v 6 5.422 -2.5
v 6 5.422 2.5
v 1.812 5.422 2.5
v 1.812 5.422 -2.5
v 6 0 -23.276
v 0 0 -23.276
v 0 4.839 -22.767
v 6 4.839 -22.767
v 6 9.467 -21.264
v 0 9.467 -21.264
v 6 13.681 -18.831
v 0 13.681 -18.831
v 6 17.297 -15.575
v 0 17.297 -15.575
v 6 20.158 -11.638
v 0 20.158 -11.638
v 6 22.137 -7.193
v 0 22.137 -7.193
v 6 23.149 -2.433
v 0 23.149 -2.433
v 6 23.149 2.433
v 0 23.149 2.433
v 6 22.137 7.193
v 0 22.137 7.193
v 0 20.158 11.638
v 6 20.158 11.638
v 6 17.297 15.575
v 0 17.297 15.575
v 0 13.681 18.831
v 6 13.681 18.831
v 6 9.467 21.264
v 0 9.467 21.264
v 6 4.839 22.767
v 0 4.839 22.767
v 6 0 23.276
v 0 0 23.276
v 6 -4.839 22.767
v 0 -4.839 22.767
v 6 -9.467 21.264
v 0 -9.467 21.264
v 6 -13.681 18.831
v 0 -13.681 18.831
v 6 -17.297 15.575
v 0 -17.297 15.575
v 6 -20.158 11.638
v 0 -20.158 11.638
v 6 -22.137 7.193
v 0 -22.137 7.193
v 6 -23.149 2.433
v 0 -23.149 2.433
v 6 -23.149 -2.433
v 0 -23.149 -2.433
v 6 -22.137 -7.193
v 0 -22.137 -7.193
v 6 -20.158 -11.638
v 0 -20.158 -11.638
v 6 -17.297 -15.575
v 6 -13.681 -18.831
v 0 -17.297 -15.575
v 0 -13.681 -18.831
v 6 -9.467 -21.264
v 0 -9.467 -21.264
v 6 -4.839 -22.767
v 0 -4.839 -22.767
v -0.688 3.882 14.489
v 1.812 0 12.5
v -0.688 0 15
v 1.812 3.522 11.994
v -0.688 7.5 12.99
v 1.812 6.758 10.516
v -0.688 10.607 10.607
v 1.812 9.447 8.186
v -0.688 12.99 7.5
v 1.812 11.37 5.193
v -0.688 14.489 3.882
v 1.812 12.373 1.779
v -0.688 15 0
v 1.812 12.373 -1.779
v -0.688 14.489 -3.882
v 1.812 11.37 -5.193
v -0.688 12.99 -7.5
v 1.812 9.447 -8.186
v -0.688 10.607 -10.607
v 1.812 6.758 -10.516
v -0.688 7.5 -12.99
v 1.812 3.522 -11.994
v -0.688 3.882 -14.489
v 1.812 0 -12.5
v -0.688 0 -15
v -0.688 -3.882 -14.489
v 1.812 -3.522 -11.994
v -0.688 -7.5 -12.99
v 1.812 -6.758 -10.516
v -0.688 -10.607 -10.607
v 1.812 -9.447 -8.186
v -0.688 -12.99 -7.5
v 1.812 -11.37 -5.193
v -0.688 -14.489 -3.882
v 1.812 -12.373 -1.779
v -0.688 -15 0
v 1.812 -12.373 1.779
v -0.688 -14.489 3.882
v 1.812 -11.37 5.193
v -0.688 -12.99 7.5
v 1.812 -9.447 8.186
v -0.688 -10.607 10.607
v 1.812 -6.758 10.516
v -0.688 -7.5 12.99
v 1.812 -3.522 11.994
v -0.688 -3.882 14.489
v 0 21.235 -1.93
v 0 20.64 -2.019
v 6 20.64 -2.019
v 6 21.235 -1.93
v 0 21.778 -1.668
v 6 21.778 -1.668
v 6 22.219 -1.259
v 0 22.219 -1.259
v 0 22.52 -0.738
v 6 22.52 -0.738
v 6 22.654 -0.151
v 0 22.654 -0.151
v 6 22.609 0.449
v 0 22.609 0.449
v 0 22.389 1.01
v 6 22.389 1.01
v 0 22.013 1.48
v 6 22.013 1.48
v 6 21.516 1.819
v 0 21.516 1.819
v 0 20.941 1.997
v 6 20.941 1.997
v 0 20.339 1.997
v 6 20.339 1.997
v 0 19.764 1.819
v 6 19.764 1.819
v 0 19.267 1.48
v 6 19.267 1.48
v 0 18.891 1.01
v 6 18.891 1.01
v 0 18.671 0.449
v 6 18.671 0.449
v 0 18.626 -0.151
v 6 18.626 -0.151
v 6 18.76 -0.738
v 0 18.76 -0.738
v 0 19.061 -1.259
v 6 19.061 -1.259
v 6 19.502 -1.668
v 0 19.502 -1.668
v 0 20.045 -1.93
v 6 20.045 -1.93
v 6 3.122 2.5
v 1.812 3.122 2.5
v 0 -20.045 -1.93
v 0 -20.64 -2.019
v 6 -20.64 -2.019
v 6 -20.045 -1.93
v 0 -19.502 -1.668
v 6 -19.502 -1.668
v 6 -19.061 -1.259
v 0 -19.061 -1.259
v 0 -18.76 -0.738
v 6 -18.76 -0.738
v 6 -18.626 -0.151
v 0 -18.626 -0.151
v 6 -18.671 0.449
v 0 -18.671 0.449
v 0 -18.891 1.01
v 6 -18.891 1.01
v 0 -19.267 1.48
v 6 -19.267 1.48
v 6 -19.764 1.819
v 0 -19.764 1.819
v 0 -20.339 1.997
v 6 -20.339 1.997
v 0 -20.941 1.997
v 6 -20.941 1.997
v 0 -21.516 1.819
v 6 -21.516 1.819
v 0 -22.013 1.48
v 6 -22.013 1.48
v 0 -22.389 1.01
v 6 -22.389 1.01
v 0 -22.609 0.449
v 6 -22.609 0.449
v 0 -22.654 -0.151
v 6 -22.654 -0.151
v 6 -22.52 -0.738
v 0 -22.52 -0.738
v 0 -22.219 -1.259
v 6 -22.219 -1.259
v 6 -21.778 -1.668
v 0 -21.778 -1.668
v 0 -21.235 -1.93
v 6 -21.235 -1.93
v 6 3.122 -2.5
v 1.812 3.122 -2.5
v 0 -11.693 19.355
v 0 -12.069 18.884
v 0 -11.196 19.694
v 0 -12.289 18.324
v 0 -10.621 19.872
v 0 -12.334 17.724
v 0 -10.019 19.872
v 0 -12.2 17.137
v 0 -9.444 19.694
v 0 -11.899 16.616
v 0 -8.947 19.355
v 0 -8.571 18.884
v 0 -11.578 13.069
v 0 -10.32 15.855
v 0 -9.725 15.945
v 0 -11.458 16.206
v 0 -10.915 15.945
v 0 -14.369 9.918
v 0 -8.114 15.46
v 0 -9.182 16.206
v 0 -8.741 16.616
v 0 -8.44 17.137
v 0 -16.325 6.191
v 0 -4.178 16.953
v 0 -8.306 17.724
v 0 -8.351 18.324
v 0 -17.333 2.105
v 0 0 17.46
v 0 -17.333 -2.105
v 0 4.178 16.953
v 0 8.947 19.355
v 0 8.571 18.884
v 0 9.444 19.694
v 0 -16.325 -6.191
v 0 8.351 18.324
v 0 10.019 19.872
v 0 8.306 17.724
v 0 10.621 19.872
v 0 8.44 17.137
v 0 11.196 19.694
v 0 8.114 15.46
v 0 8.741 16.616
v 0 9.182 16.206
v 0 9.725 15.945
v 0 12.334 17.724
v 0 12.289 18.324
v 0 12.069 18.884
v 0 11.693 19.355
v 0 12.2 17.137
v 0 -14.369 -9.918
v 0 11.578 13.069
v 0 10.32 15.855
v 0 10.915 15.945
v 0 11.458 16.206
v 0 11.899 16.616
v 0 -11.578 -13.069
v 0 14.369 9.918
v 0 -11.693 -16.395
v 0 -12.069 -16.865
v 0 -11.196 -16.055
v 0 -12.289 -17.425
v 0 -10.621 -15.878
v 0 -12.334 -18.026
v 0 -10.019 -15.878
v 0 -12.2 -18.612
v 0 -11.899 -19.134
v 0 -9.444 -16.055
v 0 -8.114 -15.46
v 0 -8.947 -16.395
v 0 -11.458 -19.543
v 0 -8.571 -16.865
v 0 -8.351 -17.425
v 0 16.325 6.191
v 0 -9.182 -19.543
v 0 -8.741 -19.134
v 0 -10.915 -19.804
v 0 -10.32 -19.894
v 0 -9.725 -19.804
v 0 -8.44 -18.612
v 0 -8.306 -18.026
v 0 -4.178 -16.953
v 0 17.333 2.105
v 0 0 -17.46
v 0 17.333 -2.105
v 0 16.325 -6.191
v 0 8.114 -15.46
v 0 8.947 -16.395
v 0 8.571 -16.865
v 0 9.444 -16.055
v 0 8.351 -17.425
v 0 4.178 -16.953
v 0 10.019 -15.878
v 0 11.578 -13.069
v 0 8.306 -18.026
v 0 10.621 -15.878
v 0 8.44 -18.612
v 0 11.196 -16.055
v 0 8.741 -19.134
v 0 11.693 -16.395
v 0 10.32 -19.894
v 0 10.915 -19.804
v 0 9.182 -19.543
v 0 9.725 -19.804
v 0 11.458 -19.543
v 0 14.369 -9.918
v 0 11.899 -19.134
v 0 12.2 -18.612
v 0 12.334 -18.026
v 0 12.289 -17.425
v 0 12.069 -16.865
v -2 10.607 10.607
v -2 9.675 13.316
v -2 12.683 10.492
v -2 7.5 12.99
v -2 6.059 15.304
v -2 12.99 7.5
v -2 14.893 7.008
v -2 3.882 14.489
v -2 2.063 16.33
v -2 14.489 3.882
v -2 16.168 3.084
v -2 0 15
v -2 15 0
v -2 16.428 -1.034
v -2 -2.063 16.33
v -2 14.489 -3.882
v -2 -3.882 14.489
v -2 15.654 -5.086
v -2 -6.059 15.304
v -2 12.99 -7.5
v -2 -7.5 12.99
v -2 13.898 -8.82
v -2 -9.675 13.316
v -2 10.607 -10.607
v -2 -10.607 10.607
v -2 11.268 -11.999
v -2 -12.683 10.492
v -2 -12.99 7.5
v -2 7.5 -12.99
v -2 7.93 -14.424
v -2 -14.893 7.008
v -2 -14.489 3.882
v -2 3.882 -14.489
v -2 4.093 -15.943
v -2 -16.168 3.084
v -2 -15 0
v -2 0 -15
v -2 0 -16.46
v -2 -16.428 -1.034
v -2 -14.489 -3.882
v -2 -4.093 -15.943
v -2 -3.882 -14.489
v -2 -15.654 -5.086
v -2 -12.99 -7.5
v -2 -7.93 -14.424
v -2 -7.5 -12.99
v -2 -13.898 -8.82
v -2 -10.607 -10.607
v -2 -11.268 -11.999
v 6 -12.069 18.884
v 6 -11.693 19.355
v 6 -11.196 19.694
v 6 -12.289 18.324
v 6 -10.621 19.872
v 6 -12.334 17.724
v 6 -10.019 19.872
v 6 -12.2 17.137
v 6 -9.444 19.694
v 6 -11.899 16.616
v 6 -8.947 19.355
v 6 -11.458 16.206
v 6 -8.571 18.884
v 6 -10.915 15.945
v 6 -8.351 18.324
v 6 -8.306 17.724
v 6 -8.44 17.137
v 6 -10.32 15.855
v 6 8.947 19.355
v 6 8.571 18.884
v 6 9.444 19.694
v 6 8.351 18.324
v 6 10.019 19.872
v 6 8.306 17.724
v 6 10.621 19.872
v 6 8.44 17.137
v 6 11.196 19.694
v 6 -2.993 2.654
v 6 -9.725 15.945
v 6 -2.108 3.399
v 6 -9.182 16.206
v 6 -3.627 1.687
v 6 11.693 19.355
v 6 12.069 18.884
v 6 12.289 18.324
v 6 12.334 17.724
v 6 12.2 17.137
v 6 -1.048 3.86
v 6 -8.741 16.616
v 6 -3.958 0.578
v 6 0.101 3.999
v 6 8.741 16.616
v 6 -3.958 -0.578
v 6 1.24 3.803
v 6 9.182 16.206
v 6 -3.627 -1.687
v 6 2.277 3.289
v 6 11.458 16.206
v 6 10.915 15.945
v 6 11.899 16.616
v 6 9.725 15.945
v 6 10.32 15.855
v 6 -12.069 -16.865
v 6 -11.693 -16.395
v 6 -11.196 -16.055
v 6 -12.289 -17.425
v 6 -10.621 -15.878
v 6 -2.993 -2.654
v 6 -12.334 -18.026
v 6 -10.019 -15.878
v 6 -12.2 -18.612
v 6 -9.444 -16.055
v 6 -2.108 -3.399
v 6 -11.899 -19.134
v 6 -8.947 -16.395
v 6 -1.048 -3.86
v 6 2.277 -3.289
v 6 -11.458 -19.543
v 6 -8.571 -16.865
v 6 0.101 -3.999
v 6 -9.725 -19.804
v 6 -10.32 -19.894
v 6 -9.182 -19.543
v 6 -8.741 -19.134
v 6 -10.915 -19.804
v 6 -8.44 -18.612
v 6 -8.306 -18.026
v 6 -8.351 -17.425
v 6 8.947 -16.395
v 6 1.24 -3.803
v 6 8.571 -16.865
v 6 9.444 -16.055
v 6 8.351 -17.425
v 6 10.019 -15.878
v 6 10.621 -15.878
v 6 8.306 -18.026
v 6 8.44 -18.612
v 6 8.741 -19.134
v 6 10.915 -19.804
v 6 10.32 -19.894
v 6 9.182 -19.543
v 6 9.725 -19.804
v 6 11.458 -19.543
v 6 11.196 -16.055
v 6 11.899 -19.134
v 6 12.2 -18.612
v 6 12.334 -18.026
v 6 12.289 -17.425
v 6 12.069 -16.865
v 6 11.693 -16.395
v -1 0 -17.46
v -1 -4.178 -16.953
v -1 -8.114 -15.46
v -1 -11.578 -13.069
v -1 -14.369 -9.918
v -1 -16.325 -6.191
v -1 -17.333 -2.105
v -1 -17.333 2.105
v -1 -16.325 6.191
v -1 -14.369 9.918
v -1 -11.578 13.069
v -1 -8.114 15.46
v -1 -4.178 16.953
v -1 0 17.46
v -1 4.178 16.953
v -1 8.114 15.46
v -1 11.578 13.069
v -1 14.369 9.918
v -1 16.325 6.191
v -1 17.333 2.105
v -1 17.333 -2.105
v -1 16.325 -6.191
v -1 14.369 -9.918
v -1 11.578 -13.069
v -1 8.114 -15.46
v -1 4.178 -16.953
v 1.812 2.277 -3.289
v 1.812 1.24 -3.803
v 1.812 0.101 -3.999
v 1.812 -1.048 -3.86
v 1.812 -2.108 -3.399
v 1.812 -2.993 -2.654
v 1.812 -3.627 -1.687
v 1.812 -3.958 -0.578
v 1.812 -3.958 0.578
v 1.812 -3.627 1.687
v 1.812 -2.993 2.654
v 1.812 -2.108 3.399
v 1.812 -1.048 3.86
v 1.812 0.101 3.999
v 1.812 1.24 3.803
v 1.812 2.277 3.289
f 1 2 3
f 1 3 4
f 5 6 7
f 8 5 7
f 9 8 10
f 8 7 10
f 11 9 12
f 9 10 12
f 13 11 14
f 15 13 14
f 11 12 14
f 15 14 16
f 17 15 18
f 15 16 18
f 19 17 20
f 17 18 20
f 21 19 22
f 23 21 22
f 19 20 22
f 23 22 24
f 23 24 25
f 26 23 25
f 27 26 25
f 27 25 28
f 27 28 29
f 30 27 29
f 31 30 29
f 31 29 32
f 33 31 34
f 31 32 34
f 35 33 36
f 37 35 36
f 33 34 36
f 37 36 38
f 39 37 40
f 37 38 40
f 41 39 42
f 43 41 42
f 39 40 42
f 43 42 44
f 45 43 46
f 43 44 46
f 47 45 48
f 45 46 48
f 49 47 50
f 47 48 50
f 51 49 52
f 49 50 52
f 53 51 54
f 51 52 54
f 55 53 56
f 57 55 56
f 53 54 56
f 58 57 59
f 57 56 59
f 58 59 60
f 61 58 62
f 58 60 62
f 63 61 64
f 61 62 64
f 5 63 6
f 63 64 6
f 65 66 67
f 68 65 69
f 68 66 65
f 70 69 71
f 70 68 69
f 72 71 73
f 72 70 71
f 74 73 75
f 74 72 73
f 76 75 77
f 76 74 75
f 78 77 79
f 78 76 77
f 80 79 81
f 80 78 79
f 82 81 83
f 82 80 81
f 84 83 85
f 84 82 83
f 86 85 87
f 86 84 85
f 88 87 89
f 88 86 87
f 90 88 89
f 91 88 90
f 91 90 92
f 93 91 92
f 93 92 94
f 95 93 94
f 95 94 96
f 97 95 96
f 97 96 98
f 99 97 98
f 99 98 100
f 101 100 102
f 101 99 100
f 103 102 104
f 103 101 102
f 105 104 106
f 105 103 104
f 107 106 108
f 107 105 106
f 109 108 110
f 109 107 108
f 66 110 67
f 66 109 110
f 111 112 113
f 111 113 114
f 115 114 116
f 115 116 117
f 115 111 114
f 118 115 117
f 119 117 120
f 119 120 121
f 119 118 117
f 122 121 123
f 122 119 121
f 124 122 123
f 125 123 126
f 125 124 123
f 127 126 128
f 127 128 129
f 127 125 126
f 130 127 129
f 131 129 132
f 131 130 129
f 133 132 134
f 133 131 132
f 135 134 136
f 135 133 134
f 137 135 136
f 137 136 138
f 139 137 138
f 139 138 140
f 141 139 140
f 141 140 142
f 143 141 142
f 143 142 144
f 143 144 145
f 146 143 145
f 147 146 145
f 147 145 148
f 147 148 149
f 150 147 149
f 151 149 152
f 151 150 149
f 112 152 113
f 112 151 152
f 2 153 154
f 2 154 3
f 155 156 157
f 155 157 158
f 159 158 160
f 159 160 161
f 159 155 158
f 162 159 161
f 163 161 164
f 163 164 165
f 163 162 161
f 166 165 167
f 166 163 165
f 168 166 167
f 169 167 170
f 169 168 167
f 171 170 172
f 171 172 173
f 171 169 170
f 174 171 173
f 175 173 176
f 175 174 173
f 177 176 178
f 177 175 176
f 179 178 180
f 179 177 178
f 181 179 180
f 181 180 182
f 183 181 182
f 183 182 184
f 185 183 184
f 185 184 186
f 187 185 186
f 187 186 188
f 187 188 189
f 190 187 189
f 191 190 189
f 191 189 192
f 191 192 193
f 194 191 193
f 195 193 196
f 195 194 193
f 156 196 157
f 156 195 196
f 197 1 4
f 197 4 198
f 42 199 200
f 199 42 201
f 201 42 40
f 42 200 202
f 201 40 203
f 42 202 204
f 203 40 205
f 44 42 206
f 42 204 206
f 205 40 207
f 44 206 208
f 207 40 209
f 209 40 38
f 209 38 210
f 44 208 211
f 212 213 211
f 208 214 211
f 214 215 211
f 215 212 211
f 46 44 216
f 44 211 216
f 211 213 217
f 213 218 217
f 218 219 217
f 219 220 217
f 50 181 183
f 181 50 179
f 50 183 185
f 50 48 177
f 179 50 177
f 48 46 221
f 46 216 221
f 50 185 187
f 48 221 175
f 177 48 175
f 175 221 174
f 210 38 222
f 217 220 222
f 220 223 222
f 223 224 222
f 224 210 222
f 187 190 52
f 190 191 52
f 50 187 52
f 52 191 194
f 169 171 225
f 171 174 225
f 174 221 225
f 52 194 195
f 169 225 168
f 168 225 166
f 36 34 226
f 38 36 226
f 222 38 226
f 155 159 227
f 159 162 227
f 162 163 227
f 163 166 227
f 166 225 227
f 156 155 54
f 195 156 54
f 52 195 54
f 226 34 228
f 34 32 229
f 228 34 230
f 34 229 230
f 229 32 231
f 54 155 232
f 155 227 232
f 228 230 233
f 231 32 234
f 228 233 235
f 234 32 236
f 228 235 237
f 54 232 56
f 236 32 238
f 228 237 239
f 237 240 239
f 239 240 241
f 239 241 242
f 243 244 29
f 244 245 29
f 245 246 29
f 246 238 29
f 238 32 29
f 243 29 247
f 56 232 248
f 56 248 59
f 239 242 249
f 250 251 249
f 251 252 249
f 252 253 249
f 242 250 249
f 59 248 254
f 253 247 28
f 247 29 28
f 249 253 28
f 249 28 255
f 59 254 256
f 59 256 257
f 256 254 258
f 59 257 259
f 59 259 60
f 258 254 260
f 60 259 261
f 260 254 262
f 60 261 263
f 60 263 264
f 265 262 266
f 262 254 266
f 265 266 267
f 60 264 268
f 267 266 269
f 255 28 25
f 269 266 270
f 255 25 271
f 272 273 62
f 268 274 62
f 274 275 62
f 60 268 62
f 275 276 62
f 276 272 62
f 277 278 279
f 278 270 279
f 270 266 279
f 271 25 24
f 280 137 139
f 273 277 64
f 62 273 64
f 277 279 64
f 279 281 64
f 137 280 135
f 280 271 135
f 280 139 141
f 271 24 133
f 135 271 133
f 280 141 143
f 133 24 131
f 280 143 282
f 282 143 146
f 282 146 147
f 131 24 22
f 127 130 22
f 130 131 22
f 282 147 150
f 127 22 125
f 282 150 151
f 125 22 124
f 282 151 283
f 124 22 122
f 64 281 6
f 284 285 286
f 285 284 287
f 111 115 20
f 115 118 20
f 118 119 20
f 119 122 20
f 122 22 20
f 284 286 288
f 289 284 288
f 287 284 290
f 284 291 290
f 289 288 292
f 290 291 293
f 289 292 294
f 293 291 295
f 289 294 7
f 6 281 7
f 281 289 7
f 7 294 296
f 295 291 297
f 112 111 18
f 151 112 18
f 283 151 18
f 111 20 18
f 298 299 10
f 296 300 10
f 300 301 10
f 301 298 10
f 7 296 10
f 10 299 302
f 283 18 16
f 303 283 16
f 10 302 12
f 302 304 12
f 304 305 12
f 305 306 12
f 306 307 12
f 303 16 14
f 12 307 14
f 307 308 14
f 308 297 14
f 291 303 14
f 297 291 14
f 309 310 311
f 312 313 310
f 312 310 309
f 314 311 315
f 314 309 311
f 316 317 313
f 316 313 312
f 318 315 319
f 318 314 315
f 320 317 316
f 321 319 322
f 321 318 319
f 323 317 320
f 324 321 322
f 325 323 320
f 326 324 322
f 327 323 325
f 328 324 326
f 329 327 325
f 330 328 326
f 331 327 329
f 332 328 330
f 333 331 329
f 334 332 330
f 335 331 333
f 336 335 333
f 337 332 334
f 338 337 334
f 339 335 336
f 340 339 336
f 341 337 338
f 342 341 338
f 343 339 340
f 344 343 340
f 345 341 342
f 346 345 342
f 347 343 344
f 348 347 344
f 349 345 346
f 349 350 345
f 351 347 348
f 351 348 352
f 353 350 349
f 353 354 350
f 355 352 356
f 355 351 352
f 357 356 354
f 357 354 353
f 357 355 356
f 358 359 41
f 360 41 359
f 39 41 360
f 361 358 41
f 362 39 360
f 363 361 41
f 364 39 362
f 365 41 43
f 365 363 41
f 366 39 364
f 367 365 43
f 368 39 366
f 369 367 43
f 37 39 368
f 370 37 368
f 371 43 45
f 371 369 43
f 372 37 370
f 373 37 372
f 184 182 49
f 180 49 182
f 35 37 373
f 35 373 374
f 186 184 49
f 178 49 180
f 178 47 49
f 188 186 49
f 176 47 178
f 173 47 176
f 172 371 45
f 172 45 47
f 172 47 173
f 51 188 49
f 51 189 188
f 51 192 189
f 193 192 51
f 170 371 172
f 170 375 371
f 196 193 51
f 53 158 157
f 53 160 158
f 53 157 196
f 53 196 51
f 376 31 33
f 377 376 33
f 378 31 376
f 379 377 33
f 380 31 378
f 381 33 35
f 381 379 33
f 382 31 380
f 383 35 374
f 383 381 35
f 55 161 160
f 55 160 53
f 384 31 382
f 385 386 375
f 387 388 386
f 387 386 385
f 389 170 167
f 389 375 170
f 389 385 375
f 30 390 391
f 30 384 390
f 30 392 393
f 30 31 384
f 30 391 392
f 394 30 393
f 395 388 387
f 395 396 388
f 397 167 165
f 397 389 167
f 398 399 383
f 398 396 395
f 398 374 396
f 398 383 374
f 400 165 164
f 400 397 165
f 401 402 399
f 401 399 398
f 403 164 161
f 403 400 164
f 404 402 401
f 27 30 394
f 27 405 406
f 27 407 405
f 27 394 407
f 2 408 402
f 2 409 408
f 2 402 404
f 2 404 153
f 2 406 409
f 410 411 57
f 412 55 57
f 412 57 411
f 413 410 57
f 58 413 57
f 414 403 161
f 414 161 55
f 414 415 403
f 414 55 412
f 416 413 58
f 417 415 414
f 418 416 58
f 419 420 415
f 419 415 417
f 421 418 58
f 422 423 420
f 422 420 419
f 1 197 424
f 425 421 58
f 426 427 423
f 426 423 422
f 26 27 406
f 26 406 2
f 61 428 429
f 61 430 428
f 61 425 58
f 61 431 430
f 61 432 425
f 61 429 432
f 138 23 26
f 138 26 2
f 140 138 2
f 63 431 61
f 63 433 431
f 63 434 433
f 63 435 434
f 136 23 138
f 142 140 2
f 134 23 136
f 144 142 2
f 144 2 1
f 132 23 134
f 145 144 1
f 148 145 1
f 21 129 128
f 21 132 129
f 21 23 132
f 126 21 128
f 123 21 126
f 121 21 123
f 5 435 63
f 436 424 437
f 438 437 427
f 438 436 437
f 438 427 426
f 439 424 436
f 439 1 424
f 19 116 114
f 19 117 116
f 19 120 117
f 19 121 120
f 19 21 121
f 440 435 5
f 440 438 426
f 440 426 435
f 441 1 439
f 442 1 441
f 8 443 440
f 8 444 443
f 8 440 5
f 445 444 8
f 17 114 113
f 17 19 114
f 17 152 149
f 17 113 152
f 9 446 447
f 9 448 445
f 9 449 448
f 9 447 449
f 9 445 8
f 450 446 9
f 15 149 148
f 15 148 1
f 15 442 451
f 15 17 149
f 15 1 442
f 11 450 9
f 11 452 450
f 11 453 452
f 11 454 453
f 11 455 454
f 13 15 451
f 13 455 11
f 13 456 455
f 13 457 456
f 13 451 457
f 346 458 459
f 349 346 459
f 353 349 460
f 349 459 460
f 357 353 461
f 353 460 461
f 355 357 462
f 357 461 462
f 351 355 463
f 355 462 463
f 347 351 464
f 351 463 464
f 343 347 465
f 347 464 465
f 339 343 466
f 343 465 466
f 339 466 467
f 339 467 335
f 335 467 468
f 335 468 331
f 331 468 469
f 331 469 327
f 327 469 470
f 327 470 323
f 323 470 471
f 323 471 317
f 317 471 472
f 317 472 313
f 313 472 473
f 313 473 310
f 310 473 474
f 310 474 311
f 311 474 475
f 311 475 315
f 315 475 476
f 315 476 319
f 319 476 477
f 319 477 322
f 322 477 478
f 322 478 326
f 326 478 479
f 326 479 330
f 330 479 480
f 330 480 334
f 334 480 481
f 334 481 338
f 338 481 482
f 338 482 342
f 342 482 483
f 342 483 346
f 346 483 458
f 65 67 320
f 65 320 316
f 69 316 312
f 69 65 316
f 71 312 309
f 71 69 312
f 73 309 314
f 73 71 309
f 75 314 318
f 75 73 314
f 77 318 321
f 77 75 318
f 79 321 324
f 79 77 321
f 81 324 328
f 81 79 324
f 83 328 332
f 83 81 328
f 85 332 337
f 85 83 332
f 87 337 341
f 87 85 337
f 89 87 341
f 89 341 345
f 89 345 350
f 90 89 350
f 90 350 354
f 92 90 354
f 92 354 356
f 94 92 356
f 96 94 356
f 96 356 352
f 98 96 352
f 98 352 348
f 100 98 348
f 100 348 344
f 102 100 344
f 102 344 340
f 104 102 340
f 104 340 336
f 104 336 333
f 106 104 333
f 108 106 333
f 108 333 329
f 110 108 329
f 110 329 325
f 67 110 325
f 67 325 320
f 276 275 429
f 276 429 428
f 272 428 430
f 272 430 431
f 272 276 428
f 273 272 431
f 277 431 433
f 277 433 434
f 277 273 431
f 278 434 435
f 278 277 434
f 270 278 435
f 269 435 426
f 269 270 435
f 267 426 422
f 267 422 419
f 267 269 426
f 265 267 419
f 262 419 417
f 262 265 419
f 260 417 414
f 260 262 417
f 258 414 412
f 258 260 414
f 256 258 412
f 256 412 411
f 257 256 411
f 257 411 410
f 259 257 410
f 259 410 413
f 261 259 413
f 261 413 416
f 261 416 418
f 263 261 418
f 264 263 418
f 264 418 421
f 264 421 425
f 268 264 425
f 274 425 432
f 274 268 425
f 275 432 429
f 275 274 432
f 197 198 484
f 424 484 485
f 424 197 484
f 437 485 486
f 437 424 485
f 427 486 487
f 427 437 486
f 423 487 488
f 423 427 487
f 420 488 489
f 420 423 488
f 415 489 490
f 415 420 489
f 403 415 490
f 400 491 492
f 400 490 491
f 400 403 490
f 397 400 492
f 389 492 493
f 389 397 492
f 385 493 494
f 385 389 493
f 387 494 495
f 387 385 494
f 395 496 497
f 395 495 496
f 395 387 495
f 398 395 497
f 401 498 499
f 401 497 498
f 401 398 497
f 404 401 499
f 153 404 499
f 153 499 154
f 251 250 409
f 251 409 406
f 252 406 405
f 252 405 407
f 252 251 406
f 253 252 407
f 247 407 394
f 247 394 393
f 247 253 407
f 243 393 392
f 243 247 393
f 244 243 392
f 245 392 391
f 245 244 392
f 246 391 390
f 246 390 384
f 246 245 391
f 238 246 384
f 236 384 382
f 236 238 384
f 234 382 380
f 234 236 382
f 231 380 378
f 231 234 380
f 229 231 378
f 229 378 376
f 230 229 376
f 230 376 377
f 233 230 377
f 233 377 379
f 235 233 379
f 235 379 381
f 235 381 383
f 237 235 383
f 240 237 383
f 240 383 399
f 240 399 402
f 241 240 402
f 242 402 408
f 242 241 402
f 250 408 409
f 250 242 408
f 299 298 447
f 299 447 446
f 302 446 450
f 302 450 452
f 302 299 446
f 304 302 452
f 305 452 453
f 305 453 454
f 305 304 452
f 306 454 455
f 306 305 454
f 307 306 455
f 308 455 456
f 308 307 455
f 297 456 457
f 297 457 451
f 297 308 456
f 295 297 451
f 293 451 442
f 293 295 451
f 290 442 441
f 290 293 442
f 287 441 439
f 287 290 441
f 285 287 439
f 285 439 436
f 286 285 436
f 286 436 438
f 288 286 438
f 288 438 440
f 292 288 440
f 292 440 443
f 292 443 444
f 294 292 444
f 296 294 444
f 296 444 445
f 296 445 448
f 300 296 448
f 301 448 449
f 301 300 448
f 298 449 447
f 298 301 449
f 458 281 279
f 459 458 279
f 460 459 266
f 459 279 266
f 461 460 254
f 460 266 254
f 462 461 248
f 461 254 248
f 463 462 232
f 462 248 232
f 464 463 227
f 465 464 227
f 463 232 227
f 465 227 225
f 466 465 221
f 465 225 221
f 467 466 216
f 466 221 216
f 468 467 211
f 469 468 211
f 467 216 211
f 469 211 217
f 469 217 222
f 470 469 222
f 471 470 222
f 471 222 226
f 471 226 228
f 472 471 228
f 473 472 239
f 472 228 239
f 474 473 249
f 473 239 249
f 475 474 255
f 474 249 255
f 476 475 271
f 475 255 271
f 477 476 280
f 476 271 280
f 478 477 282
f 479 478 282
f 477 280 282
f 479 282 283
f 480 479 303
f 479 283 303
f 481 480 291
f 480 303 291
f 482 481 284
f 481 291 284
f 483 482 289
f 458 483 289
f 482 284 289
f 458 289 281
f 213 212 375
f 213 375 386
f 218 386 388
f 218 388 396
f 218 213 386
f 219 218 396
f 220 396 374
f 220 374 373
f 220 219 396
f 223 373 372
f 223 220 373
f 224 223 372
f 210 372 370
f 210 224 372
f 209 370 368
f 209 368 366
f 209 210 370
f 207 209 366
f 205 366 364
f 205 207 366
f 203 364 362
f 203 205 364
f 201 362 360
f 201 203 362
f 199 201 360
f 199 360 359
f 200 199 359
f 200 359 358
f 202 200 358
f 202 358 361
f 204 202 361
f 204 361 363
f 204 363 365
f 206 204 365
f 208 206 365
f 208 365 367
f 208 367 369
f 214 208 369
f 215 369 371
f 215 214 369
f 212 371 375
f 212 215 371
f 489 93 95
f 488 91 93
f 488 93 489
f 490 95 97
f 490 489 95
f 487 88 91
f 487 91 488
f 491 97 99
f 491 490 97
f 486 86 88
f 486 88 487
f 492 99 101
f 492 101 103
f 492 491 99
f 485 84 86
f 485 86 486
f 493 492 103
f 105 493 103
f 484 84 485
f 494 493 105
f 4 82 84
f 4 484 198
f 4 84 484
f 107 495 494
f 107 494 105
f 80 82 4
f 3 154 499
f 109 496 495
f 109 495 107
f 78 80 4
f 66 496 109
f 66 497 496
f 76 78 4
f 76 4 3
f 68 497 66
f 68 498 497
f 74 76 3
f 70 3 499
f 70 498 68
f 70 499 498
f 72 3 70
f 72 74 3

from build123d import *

# Parameters (mm, degrees)
SKETCH1_R           = 23.276074499
SKETCH1_R_2         = 2.0193
BOSS_EXTRUDE1_DEPTH = 6
SKETCH2_R           = 17.46
SKETCH2_R_2         = 15
BOSS_EXTRUDE2_DEPTH = 2
CUT_EXTRUDE2_START  = -1.8125
SKETCH4_R           = 15
CUT_EXTRUDE2_DEPTH  = 1.8125
CHAMFER4_SIZE       = 2.5
CHAMFER5_SIZE       = 1
CUT_EXTRUDE3_DEPTH  = 20.5


with BuildPart() as part:
    # Sketch1 → Boss-Extrude1 (new body)
    with BuildSketch(Plane(origin=(0, 0, 0), x_dir=(0, 0, -1), z_dir=(1, 0, 0))):
        Circle(SKETCH1_R)
        with Locations((0, 20.64)):
            Circle(SKETCH1_R_2, mode=Mode.SUBTRACT)
        with Locations((17.874764334, 10.32)):
            Circle(SKETCH1_R_2, mode=Mode.SUBTRACT)
        with Locations((17.874764334, -10.32)):
            Circle(SKETCH1_R_2, mode=Mode.SUBTRACT)
        with Locations((0, -20.64)):
            Circle(SKETCH1_R_2, mode=Mode.SUBTRACT)
        with Locations((-17.874764334, -10.32)):
            Circle(SKETCH1_R_2, mode=Mode.SUBTRACT)
        with Locations((-17.874764334, 10.32)):
            Circle(SKETCH1_R_2, mode=Mode.SUBTRACT)
    extrude(amount=BOSS_EXTRUDE1_DEPTH)

    # Sketch2 → Boss-Extrude2 (add)
    with BuildSketch(Plane.ZY):
        with Locations(Location((0, 0, 0), (0, 0, 180))):
            Circle(SKETCH2_R)
        Circle(SKETCH2_R_2, mode=Mode.SUBTRACT)
    extrude(amount=BOSS_EXTRUDE2_DEPTH)

    # Sketch4 → Cut-Extrude2 (cut)
    with BuildSketch(Plane.ZY.offset(CUT_EXTRUDE2_START)):
        Circle(SKETCH4_R)
    extrude(amount=CUT_EXTRUDE2_DEPTH, mode=Mode.SUBTRACT)

    # Chamfer4
    chamfer4_edges = [part.edges().sort_by_distance(p)[0] for p in [
        (1.8125, 0, -15),
    ]]
    chamfer(chamfer4_edges, length=CHAMFER4_SIZE)

    # Chamfer5
    chamfer5_edges = [part.edges().sort_by_distance(p)[0] for p in [
        (-2, 0, 17.46),
    ]]
    chamfer(chamfer5_edges, length=CHAMFER5_SIZE)

    # Sketch7 → Cut-Extrude3 (cut)
    with BuildSketch(Plane(origin=(6, 0, 0), x_dir=(0, 0, -1), z_dir=(1, 0, 0))):
        with BuildLine():
            Line((-2.5, 3.122498999), (-2.5, 5.422498999))
            Line((-2.5, 5.422498999), (2.5, 5.422498999))
            Line((2.5, 5.422498999), (2.5, 3.122498999))
            ThreePointArc((2.5, 3.122498999), (0, -4), (-2.5, 3.122498999))
        make_face()
    extrude(amount=-CUT_EXTRUDE3_DEPTH, mode=Mode.SUBTRACT)


solid = part.part
